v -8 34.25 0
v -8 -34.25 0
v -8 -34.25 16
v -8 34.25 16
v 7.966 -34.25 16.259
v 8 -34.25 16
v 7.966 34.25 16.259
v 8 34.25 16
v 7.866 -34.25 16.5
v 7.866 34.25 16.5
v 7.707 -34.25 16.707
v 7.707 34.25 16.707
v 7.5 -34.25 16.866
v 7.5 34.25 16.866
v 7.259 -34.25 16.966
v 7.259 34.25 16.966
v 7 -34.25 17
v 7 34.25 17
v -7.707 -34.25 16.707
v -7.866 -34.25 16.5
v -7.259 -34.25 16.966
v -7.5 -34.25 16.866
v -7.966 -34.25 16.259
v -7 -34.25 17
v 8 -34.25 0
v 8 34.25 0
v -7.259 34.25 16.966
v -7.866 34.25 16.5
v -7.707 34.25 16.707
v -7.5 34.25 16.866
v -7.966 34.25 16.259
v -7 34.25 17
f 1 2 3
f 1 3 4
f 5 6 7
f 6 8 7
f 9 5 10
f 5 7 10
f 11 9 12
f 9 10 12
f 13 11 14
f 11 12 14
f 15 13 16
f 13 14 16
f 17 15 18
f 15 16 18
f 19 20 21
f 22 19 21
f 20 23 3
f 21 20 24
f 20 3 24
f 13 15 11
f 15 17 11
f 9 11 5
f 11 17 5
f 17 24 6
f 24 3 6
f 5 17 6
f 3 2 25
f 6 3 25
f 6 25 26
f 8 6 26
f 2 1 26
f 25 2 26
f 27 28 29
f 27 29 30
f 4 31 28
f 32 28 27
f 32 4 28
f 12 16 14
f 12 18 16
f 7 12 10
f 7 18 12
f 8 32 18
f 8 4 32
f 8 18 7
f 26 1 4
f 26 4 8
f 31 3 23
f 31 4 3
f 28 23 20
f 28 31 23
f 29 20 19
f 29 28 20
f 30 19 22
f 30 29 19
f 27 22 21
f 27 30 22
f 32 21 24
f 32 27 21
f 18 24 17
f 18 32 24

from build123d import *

# Parameters (mm, degrees)
SKETCH_1_W      = 16
SKETCH_1_H      = 68.5
EXTRUDE_1_DEPTH = 0.1
SKETCH_2_W      = 16
SKETCH_2_H      = 68.5
EXTRUDE_2_DEPTH = 16.9
FILLET_1_R      = 1


with BuildPart() as part:
    # 草图1 → 拉伸1 (new body)
    with BuildSketch(Plane.XY):
        Rectangle(SKETCH_1_W, SKETCH_1_H)
    extrude(amount=EXTRUDE_1_DEPTH)

    # 草图2 → 拉伸2 (add)
    with BuildSketch(Plane.XY.offset(0.1)):
        Rectangle(SKETCH_2_W, SKETCH_2_H)
    extrude(amount=EXTRUDE_2_DEPTH)

    # 圆角1
    fillet_1_edges = [part.edges().sort_by_distance(p)[0] for p in [
        (-8, 0, 17),
        (8, 0, 17),
    ]]
    fillet(fillet_1_edges, radius=FILLET_1_R)


solid = part.part
